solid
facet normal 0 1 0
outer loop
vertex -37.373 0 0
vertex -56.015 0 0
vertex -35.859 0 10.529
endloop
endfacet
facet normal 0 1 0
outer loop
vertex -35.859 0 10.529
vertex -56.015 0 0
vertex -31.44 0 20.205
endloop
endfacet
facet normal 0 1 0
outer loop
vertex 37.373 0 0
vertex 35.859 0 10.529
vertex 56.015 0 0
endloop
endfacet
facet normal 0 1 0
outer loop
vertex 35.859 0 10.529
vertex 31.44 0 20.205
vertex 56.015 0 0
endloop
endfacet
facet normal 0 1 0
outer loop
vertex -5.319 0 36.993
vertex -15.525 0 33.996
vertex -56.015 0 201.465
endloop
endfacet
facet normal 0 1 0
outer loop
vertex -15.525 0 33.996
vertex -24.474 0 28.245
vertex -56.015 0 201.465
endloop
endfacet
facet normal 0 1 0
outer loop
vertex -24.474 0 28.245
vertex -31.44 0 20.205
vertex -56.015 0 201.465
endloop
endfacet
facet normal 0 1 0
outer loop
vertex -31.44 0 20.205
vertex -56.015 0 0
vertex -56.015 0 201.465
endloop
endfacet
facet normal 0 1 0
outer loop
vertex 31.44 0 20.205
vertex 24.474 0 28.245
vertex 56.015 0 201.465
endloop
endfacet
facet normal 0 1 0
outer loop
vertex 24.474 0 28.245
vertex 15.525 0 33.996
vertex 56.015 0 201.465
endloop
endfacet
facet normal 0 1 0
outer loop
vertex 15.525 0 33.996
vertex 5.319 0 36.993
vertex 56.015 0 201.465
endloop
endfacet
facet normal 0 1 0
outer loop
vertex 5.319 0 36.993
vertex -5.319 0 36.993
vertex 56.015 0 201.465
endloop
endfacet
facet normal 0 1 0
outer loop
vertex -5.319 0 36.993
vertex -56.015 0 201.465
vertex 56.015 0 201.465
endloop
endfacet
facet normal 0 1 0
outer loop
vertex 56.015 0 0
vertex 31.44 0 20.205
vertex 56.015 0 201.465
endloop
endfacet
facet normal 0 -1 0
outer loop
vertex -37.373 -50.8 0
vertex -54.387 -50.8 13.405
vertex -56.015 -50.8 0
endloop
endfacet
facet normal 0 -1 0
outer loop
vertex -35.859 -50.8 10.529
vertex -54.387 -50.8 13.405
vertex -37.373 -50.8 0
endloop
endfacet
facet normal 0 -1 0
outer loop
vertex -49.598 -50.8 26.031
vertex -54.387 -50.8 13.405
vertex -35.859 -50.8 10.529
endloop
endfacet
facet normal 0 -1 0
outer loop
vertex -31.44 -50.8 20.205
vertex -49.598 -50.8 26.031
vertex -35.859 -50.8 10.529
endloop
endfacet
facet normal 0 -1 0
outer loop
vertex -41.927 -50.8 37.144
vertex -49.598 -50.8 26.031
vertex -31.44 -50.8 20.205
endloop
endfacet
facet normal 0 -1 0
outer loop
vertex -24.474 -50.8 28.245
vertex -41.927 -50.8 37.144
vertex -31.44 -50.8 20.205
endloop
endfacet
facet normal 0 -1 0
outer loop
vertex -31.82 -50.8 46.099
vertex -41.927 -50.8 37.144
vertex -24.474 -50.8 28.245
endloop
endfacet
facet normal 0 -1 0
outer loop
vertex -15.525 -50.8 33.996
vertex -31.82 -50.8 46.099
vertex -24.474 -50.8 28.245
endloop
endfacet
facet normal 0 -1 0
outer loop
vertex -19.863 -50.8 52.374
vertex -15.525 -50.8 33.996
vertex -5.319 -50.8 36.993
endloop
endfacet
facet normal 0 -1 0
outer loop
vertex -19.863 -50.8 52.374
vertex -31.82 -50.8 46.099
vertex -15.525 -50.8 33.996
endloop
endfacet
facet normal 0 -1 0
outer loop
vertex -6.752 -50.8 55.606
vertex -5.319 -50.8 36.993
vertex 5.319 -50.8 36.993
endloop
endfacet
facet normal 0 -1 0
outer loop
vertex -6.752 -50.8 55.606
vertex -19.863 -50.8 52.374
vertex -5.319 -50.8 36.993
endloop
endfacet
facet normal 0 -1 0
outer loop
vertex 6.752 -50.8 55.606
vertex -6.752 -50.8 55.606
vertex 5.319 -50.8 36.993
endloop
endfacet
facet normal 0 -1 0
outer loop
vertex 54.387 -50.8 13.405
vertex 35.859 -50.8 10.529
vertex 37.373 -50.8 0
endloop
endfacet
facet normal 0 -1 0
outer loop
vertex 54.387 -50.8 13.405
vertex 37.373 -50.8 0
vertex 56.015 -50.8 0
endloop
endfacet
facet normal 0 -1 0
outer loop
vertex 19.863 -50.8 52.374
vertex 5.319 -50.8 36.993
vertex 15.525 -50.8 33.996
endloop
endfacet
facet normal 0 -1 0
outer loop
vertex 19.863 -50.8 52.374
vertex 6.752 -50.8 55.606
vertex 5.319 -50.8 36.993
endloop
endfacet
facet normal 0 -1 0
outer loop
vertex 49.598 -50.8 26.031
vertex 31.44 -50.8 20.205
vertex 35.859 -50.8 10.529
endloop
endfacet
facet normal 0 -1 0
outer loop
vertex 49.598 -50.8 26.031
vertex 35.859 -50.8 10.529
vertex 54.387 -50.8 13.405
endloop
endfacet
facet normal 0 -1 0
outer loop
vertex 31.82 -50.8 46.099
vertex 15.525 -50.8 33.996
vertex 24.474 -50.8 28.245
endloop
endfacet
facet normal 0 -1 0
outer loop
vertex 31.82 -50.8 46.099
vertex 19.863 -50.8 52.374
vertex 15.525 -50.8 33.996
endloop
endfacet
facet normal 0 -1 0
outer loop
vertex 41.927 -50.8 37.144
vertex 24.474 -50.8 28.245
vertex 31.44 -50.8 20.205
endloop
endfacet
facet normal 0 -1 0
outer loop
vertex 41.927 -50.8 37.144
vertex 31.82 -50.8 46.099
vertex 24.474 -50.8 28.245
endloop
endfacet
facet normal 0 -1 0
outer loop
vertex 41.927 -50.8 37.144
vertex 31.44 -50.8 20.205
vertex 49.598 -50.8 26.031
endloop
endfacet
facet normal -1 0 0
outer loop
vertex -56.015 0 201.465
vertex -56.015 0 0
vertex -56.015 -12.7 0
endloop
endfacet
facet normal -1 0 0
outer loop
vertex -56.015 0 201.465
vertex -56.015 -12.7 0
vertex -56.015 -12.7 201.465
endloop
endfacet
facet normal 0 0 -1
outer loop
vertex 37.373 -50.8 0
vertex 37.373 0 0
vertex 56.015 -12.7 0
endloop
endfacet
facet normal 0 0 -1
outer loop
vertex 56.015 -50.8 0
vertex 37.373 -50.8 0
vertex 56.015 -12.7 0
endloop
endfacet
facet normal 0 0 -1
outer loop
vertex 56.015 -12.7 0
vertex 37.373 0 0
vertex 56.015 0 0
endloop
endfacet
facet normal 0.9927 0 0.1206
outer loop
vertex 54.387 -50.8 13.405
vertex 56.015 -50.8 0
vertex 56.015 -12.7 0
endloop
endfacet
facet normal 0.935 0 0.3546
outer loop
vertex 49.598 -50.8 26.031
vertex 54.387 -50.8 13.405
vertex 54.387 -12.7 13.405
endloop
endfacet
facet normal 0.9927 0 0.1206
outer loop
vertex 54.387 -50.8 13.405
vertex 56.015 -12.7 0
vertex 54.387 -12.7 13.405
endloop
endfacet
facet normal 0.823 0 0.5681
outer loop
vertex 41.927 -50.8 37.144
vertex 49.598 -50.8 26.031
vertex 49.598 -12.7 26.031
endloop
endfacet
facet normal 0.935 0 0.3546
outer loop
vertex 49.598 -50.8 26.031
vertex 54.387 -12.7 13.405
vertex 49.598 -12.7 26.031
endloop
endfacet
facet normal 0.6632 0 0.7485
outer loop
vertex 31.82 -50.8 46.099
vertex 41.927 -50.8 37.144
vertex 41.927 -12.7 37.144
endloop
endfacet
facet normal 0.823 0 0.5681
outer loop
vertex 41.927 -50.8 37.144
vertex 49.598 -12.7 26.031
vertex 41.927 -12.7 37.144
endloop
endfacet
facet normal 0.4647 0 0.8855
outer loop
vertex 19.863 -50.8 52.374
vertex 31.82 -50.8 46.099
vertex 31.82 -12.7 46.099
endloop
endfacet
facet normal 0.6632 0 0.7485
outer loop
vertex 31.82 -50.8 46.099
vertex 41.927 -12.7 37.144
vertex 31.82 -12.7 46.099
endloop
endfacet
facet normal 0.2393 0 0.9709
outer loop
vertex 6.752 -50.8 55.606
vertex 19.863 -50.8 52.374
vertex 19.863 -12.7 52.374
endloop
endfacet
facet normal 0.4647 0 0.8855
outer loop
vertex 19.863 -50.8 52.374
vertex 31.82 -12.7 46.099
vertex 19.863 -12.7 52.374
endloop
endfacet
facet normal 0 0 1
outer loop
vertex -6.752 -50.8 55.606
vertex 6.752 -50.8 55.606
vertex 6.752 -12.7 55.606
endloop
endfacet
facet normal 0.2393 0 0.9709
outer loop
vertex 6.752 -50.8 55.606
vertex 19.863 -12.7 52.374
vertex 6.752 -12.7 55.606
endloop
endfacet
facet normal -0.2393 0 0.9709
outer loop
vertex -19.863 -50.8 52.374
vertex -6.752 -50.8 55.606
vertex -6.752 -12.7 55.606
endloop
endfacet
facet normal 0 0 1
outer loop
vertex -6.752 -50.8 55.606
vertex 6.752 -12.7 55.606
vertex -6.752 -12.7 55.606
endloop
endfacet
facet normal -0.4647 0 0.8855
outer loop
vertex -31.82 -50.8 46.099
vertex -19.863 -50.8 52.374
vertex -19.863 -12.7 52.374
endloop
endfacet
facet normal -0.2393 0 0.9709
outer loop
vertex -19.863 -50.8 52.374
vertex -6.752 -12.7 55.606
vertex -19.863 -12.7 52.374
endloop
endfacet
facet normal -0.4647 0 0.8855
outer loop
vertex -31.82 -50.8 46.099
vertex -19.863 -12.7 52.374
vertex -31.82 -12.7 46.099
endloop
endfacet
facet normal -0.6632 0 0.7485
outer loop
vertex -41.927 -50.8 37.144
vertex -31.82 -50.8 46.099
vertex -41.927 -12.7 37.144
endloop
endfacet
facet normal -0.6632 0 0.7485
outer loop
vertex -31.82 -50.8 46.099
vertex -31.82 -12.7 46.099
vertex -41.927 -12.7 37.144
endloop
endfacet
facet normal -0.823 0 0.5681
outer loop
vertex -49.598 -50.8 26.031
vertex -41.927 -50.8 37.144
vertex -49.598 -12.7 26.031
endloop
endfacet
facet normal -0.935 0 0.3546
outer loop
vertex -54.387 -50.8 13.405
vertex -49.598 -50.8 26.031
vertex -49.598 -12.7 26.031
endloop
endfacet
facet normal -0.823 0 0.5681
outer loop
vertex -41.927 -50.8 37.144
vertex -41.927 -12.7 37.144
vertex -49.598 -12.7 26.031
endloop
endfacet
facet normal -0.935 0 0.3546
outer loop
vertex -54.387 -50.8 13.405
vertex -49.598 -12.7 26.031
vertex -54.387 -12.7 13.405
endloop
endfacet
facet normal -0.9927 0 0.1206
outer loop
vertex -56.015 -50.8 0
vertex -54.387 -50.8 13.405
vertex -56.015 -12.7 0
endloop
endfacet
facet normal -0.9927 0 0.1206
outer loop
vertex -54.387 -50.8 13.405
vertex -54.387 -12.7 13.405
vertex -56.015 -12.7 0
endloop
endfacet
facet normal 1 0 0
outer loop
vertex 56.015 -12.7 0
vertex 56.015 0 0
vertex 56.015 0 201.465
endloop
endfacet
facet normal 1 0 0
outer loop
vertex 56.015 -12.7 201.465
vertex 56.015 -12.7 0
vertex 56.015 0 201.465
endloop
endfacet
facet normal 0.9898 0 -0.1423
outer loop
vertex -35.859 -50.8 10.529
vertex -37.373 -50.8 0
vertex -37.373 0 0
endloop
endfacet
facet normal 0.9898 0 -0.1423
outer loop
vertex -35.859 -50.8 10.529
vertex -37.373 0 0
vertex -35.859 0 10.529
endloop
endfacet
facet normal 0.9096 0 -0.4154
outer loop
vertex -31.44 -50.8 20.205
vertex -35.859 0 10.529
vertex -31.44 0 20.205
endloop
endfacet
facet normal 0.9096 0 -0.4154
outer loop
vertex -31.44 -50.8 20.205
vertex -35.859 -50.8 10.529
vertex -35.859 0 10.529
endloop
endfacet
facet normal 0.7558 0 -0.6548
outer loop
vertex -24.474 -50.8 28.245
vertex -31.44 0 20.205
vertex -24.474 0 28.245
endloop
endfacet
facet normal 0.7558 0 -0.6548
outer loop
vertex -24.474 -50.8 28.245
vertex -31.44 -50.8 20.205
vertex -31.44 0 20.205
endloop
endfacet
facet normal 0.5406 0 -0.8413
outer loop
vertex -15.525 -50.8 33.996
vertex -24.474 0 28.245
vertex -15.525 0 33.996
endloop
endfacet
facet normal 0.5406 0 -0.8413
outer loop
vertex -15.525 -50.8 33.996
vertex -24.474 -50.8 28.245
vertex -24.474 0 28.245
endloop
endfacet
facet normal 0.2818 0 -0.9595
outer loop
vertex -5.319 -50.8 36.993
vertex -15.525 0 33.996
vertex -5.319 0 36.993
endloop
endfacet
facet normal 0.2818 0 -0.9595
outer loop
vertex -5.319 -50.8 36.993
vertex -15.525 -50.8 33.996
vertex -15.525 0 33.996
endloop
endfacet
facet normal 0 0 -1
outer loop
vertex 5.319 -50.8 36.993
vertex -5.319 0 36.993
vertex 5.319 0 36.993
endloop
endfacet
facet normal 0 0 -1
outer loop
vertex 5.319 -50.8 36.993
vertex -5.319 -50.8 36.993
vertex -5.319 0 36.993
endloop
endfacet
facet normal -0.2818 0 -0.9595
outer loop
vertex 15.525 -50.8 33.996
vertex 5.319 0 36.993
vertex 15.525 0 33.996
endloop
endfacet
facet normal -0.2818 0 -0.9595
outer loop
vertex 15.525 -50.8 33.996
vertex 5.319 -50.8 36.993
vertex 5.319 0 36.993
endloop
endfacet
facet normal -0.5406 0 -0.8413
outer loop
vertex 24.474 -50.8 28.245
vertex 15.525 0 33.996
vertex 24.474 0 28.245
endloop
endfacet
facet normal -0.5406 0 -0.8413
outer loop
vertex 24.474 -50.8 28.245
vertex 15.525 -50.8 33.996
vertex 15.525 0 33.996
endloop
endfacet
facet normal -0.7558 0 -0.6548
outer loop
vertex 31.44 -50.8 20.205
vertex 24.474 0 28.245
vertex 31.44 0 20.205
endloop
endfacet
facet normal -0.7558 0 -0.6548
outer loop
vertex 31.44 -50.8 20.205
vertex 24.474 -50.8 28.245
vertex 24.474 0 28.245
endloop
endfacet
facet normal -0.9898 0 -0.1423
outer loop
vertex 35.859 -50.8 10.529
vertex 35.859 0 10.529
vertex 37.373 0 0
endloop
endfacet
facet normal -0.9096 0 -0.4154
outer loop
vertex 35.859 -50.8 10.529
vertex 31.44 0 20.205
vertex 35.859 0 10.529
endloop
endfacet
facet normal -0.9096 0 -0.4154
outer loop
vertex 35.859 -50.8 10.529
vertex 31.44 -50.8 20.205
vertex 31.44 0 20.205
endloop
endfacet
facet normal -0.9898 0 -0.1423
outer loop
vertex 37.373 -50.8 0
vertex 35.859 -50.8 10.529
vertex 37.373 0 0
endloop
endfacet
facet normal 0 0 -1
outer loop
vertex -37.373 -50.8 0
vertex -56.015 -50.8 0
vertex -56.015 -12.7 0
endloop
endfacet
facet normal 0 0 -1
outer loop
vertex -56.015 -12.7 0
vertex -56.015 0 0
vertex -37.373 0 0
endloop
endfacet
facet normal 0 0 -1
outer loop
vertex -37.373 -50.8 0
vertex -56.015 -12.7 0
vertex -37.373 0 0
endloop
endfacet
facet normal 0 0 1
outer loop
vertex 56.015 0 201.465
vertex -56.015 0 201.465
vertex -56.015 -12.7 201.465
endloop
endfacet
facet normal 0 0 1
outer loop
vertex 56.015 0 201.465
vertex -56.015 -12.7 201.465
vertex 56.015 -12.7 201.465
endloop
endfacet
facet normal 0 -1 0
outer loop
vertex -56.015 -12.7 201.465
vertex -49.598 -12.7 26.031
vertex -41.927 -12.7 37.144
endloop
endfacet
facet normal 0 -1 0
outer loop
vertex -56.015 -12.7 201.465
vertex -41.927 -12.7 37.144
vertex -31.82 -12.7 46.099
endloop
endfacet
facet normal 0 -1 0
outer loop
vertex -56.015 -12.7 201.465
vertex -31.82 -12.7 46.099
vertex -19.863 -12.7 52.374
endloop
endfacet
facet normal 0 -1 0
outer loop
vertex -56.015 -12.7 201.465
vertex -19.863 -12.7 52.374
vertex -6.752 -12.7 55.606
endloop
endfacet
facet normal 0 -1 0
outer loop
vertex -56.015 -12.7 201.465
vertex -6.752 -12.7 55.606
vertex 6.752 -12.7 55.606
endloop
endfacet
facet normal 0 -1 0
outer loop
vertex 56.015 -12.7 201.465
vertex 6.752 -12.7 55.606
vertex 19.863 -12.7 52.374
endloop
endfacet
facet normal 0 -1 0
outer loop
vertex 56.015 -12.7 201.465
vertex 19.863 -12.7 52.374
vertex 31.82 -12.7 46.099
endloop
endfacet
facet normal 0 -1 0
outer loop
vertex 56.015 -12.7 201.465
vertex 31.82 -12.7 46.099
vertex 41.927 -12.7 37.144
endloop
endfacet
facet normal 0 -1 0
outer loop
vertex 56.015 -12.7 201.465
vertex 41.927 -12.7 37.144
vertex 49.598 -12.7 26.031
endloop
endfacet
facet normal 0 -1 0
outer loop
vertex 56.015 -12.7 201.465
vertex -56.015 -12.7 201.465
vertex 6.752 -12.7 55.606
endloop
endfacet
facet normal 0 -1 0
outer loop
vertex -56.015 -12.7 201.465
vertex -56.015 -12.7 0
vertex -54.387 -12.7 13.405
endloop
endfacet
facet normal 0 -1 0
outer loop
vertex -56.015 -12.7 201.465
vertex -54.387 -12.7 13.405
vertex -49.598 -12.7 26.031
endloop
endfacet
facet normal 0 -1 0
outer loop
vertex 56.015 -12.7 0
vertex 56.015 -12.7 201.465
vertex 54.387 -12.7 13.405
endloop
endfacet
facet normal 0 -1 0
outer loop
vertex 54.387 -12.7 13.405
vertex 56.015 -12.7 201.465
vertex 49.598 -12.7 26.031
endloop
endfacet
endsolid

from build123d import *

# Parameters (mm, degrees)
F1_W     = 112.0290251324
F1_H     = 201.4646567404
F2_DEPTH = 12.7
F3_DEPTH = 50.8
F4_DEPTH = 25.4


with BuildPart() as f2:
    # F1 (on Front) → F2 (new body)
    with BuildSketch(Plane.XZ):
        with Locations((0, 100.7323283702)):
            Rectangle(F1_W, F1_H)
    extrude(amount=F2_DEPTH)

    # F0 (on Front) → F3 (join)
    with BuildSketch(Plane.XZ):
        with BuildLine():
            ThreePointArc((-37.3730720306, 0), (0, 37.3730720306), (37.3730720306, 0))
            Line((37.3730720306, 0), (56.0145125662, 0))
            ThreePointArc((56.0145125662, 0), (0, 56.0145125662), (-56.0145125662, 0))
            Line((-56.0145125662, 0), (-37.3730720306, 0))
        make_face()
    extrude(amount=F3_DEPTH)

    # F4 (cut): a face of the model
    f4_faces = [f2.faces().sort_by_distance(p)[0] for p in [
        (0, -12.7, 15.8616244059),
    ]]
    extrude(f4_faces, amount=-F4_DEPTH, mode=Mode.SUBTRACT)


solid = f2.part
